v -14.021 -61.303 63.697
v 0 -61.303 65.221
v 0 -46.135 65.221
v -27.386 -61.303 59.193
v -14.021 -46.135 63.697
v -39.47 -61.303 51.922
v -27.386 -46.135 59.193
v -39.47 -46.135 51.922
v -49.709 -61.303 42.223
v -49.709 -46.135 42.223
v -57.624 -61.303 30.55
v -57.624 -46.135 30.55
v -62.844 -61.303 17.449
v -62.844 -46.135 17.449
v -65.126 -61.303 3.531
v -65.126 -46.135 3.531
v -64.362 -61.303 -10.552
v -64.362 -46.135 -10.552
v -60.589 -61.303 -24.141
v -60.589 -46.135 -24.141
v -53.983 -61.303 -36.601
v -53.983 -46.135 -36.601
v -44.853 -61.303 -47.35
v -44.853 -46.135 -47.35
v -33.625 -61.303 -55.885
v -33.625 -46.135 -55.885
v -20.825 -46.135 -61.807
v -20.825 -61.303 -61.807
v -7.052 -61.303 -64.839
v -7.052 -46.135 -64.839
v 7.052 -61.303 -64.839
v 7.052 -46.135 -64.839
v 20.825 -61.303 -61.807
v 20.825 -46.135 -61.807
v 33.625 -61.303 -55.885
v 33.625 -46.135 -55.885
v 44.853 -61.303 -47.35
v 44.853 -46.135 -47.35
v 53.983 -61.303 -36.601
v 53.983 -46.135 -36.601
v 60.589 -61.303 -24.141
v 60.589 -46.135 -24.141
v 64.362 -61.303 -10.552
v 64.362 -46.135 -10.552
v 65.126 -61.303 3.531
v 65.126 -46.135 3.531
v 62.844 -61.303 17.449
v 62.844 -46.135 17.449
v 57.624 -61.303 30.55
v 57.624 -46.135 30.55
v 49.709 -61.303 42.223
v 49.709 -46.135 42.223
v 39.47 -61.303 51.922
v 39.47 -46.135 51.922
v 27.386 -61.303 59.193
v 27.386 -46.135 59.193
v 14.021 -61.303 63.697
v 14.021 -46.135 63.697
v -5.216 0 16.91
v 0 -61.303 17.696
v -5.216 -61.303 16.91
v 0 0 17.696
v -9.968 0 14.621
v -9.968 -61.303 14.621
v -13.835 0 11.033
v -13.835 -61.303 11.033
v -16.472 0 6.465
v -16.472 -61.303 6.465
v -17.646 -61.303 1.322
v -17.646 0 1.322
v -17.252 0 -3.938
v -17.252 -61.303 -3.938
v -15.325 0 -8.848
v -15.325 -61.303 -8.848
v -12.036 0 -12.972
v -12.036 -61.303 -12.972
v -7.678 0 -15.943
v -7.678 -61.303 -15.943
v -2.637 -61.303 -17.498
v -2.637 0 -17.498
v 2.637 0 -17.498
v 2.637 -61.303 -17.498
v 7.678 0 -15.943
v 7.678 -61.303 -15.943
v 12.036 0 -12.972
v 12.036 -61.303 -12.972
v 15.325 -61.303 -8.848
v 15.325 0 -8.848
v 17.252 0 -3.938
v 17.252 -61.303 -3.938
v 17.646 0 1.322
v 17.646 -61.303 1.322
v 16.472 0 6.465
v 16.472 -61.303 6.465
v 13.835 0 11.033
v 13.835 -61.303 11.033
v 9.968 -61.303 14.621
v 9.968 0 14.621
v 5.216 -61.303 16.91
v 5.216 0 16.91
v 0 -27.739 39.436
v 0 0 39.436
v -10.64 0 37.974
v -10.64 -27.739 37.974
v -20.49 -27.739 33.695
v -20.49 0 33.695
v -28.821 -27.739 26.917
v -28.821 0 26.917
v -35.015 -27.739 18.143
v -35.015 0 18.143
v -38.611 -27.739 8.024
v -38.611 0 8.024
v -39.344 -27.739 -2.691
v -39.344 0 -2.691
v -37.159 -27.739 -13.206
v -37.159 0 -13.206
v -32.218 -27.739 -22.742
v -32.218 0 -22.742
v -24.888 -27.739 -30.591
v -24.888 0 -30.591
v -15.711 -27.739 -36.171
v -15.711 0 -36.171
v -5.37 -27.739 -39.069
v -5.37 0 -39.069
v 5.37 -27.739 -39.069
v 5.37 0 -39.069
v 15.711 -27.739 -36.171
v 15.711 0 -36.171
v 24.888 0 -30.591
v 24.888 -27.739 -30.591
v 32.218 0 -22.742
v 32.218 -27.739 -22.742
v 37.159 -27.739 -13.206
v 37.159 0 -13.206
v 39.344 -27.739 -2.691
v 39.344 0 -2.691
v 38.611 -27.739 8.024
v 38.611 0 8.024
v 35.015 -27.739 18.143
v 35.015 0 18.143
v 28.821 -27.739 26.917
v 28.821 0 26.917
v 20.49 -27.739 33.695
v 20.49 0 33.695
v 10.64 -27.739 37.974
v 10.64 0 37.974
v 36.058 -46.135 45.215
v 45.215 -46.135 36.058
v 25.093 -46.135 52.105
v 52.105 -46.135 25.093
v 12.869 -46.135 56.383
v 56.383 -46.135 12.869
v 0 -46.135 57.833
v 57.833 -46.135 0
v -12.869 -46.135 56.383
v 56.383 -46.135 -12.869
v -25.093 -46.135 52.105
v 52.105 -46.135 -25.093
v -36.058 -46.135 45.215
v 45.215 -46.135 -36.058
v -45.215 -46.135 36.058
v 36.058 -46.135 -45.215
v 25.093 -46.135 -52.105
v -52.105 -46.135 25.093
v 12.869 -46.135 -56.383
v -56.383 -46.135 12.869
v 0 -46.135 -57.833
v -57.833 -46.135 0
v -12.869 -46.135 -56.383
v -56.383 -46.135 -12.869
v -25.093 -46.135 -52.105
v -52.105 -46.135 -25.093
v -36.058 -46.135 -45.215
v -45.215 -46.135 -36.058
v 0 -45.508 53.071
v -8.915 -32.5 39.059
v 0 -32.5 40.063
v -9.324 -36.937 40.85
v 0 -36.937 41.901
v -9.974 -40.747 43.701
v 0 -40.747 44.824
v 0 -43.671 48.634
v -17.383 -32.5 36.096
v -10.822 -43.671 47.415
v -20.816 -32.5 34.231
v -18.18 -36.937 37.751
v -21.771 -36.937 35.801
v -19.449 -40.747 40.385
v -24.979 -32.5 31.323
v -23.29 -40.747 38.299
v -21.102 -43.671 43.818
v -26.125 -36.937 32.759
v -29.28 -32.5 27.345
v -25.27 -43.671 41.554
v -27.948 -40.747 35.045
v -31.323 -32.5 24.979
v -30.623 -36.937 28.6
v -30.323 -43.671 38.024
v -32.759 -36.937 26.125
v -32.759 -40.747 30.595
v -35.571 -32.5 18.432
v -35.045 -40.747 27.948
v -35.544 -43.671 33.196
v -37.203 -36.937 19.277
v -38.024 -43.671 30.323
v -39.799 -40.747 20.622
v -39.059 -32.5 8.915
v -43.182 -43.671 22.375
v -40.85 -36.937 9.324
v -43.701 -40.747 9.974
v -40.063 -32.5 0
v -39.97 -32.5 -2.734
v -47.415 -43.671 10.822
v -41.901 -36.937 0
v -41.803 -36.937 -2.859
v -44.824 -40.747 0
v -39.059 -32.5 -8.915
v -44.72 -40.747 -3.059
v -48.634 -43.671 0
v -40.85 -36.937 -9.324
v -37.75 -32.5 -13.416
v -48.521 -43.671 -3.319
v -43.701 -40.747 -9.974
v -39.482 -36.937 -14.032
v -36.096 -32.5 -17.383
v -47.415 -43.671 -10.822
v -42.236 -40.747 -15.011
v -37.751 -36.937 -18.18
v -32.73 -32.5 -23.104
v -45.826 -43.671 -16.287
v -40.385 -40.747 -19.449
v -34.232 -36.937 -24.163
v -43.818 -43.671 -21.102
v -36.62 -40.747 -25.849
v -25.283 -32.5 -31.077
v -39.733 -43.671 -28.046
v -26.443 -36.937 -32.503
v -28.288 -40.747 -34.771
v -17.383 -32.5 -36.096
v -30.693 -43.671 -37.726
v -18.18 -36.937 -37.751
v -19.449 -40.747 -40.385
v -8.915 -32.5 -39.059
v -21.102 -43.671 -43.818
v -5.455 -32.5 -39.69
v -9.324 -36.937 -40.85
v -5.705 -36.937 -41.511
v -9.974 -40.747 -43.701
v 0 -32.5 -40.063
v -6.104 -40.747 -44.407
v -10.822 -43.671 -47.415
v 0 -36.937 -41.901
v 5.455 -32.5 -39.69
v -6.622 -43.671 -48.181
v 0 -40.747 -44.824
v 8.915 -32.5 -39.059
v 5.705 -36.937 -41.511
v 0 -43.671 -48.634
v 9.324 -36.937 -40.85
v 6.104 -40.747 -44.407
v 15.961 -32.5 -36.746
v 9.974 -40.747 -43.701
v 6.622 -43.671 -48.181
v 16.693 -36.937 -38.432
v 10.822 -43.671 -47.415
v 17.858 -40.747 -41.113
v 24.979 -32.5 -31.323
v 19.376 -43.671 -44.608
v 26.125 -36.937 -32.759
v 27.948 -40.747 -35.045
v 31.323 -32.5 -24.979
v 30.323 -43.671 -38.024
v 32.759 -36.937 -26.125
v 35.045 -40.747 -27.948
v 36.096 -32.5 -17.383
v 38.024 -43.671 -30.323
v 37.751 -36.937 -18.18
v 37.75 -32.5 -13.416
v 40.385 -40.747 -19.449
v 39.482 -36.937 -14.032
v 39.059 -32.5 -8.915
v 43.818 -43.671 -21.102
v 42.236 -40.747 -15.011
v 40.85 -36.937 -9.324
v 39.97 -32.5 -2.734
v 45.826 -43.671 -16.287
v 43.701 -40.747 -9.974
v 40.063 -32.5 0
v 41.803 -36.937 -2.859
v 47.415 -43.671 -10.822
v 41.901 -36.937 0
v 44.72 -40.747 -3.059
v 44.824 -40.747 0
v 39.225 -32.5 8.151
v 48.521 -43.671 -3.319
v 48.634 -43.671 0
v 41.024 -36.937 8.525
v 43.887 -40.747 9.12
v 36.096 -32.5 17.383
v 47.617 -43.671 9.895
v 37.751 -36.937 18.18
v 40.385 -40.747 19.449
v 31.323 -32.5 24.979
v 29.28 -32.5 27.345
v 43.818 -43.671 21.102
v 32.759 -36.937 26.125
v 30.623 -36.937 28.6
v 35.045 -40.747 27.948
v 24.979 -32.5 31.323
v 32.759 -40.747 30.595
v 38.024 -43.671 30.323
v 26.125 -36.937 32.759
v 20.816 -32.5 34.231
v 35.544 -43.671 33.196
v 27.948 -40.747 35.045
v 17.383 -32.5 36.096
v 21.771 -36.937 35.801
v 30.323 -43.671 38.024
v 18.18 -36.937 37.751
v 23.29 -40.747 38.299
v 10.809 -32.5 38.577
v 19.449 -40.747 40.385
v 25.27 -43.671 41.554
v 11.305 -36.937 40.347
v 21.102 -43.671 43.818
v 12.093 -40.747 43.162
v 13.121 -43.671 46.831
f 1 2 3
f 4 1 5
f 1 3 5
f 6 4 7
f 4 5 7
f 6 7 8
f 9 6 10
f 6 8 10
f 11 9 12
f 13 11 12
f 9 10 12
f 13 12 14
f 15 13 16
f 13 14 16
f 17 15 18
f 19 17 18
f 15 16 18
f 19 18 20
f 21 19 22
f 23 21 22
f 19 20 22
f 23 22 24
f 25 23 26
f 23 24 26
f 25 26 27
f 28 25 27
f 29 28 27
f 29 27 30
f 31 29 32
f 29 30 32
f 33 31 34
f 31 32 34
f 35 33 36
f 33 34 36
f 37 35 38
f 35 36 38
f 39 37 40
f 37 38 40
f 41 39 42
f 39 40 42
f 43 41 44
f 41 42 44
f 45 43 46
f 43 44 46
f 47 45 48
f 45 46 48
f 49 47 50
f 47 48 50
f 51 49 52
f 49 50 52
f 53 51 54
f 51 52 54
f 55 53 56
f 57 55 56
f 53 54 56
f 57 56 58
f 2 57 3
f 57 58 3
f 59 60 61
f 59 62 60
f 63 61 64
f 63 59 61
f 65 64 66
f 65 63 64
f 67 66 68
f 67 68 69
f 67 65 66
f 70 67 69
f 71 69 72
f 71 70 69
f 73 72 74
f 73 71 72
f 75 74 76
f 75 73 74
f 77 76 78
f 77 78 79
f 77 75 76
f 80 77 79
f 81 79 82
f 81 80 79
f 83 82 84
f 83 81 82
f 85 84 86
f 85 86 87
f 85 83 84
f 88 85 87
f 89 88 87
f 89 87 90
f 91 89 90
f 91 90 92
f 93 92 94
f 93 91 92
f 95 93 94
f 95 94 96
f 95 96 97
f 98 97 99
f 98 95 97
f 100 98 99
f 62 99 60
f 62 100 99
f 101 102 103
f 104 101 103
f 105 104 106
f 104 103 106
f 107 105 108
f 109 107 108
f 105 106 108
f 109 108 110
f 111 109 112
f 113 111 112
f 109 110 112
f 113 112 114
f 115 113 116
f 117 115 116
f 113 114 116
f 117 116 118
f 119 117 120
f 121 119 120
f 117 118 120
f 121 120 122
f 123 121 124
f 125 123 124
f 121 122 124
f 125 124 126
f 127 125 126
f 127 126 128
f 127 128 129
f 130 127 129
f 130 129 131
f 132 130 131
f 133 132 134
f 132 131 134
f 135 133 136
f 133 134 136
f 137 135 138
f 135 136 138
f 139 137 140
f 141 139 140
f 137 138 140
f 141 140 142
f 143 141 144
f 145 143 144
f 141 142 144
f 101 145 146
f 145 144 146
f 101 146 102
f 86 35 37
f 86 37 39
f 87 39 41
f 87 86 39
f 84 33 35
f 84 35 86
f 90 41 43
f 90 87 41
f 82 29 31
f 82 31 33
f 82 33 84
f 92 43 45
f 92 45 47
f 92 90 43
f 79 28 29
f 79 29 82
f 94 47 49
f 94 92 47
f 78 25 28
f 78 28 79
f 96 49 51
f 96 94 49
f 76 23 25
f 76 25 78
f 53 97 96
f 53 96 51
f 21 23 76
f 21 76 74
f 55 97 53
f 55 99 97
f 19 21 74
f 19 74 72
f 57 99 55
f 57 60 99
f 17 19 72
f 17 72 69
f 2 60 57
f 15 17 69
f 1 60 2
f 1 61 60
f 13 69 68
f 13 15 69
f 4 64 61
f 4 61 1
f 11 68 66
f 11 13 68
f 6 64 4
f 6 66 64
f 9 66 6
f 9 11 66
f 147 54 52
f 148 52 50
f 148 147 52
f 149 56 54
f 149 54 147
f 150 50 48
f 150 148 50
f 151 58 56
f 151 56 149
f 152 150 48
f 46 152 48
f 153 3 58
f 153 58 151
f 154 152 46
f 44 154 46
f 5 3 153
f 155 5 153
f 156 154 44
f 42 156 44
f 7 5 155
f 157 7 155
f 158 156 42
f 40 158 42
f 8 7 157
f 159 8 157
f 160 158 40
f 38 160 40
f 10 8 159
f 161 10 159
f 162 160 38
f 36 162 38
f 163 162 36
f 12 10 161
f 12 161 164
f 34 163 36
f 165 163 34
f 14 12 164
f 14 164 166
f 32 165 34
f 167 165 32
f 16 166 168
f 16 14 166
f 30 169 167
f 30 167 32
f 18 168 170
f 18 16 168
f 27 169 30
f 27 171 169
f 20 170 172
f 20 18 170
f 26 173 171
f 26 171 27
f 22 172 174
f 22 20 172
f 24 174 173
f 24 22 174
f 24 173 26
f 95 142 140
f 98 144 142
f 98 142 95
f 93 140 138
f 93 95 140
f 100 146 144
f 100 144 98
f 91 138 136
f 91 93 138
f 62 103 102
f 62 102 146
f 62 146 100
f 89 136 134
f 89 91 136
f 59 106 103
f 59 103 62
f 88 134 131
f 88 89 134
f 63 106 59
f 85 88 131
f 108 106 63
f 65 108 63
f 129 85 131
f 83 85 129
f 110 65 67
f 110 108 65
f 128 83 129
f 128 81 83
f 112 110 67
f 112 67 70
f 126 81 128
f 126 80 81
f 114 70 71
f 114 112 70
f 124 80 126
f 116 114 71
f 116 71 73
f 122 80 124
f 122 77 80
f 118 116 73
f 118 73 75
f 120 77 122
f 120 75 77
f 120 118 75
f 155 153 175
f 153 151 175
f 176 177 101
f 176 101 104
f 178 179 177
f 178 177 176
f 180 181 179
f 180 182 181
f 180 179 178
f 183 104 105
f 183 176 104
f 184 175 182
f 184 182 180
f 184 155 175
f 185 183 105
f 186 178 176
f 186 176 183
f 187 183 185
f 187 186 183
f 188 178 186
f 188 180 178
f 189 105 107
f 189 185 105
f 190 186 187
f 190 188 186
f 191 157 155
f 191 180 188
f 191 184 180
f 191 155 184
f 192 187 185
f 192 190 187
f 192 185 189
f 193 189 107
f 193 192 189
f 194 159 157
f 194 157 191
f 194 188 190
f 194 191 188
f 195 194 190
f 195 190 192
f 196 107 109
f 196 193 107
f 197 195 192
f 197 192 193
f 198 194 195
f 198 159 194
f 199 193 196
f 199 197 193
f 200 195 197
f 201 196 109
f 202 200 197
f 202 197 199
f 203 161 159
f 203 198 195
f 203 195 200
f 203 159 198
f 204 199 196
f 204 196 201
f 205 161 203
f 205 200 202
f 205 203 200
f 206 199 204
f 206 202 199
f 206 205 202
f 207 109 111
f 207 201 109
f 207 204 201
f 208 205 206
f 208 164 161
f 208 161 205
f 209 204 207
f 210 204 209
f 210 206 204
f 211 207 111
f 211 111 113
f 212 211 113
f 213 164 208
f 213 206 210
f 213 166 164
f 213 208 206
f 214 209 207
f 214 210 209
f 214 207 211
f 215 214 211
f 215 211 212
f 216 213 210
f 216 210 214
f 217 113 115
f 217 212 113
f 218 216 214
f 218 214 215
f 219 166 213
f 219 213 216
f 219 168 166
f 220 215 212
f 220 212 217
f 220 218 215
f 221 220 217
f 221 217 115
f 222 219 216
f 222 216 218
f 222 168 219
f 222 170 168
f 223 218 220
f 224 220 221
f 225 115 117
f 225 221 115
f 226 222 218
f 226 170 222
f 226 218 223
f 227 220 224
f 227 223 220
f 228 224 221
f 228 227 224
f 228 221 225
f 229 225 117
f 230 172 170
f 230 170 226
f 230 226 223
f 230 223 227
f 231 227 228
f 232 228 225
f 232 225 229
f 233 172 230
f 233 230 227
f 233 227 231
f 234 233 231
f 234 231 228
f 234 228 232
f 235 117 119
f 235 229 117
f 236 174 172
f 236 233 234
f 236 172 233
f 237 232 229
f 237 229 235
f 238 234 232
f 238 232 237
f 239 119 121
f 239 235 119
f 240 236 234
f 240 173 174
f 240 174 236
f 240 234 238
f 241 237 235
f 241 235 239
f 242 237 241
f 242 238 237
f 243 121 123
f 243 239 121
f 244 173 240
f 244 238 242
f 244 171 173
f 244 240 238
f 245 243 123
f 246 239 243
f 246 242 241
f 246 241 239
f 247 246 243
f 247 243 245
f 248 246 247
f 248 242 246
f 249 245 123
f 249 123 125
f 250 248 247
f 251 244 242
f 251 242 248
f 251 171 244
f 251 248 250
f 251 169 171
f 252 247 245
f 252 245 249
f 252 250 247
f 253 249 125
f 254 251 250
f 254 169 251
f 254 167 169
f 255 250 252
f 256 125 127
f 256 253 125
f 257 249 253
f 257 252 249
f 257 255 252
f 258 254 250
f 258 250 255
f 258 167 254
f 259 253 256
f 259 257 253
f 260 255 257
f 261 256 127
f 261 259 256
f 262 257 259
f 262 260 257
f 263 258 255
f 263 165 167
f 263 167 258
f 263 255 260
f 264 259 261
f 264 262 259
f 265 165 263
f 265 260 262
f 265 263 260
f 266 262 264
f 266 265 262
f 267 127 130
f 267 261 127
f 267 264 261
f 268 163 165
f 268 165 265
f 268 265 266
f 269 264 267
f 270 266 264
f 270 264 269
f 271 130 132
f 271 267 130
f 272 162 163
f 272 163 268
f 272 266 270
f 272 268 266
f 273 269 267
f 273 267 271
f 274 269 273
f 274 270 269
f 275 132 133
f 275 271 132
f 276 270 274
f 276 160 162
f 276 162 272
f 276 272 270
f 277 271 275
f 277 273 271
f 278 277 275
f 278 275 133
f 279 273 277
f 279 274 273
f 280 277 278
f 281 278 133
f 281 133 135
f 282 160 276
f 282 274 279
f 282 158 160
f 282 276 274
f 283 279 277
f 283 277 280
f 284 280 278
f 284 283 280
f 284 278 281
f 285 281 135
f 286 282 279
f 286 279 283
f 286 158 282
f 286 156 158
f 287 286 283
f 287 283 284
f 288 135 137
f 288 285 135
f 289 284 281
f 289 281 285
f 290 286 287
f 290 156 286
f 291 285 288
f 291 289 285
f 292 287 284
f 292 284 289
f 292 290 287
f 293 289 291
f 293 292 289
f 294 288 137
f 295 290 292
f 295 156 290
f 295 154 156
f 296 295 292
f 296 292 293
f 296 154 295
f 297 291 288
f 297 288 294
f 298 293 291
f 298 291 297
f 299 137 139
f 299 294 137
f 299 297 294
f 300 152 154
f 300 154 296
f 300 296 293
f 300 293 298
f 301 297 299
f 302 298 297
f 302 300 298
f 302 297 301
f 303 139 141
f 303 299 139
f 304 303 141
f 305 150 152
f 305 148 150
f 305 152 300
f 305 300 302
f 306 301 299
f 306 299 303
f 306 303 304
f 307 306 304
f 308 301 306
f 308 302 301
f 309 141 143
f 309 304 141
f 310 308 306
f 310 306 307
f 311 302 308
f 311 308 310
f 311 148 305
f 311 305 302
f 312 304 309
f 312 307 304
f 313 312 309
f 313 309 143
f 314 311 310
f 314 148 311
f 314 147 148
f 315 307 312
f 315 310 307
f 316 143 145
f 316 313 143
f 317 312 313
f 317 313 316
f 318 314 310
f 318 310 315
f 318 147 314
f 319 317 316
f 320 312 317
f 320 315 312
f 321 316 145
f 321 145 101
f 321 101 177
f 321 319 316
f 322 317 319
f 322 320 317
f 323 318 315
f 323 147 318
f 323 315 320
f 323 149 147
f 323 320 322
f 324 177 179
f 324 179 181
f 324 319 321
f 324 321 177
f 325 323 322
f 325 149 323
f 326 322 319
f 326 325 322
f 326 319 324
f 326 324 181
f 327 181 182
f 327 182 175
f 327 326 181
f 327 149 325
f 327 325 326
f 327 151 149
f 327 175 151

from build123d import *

# Parameters (mm, degrees)
F0_W   = 15.167773
F0_H   = 25.785211
F0_H_2 = 21.740476
F0_W_2 = 46.13531
F2_R   = 18.396307


with BuildPart() as f1:
    # F0 (on Right) → F1 (revolve)
    with BuildSketch(Plane.YZ):
        with Locations((-53.719196, 52.328815)):
            Rectangle(F0_W, F0_H)
        with Locations((-53.719196, 28.565972)):
            Rectangle(F0_W, F0_H_2)
        with Locations((-23.067655, 28.565972)):
            Rectangle(F0_W_2, F0_H_2)
    revolve(axis=Axis((0, -30.651541, 0), (0, -1, 0)))

    # F2
    f2_edges = [f1.edges().sort_by_distance(p)[0] for p in [
        (0, -46.13531, -39.43621),
    ]]
    fillet(f2_edges, radius=F2_R)


solid = f1.part
